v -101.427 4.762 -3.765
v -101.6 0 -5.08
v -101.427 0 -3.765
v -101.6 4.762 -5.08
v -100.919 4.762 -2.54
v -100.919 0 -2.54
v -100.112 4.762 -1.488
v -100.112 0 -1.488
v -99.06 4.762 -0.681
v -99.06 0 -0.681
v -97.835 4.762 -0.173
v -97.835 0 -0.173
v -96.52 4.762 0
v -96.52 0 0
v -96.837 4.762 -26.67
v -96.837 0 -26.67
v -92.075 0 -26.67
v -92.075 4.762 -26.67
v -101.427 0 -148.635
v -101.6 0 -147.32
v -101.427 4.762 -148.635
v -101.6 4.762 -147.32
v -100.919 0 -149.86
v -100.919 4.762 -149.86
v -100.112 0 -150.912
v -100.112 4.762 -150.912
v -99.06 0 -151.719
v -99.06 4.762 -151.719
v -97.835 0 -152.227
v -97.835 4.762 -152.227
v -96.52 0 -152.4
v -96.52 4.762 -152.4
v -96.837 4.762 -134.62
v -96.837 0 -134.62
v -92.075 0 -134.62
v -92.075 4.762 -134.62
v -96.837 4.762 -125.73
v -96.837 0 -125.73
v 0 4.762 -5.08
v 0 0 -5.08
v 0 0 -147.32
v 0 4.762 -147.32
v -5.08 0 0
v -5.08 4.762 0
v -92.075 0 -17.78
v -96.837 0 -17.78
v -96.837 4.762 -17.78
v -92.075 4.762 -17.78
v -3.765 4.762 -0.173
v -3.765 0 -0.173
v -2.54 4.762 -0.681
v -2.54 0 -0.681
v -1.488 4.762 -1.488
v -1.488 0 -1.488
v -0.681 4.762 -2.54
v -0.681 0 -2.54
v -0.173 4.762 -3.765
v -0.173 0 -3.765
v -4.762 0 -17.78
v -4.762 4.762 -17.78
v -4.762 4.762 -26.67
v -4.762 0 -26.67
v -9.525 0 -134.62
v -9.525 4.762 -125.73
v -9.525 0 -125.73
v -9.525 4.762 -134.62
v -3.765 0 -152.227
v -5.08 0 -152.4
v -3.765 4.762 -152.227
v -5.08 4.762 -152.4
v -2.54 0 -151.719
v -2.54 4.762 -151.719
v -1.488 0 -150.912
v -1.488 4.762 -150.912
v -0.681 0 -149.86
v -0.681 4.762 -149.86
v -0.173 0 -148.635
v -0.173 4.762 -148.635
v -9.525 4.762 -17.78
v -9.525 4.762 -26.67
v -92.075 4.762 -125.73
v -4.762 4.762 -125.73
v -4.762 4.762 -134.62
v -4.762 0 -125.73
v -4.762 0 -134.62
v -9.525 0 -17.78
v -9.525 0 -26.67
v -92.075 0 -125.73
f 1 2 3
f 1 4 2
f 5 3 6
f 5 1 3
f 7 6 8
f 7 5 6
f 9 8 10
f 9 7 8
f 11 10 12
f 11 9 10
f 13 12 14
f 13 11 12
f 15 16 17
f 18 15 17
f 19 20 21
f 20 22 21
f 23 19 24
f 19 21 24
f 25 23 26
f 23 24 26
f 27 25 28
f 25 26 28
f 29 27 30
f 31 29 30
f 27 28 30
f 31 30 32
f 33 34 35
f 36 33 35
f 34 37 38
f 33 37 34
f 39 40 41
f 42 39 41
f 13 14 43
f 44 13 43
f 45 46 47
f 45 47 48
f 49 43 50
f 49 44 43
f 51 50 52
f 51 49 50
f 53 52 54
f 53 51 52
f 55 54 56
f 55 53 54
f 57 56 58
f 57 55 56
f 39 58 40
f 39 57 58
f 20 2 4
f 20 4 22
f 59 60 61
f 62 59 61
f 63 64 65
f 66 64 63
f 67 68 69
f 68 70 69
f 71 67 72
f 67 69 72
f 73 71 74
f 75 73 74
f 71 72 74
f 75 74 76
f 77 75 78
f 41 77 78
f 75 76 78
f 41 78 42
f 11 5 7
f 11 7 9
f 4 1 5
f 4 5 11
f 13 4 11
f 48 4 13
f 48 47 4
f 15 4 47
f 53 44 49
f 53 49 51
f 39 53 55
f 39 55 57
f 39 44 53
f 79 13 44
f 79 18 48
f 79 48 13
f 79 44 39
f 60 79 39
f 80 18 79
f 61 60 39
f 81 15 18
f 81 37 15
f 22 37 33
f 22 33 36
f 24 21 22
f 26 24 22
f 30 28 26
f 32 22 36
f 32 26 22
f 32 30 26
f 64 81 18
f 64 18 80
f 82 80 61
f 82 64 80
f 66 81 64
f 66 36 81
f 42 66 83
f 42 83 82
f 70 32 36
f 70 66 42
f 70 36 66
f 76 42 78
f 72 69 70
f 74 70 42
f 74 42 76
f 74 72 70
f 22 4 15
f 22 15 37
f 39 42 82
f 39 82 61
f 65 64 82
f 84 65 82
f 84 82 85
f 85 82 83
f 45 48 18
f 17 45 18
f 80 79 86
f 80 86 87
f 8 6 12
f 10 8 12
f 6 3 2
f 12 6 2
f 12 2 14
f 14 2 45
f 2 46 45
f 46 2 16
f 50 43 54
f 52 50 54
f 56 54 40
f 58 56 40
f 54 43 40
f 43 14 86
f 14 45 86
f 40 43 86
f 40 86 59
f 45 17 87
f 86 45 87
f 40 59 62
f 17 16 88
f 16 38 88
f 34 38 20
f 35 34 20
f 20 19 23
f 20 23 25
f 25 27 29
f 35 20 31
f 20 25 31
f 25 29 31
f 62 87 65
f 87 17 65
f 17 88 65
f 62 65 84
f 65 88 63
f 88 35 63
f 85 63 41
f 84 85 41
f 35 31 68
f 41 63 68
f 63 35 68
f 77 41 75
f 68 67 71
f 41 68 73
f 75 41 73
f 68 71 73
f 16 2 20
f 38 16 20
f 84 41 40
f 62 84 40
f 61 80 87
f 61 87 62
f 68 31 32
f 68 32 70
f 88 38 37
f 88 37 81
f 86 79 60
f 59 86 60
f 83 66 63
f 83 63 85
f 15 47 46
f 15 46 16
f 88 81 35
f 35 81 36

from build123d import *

# Parameters (mm, degrees)
SKETCH1_W           = 101.6
SKETCH1_H           = 152.4
BOSS_EXTRUDE1_DEPTH = 4.7625
SKETCH2_W           = 4.7625
SKETCH2_H           = 8.89
CUT_EXTRUDE1_DEPTH  = 6.35
FILLET1_R           = 5.08


with BuildPart() as part:
    # Sketch1 → Boss-Extrude1 (new body)
    with BuildSketch(Plane(origin=(0, 0, 0), x_dir=(1, 0, 0), z_dir=(0, 1, 0))):
        with Locations((-50.8, 76.2)):
            Rectangle(SKETCH1_W, SKETCH1_H)
    extrude(amount=BOSS_EXTRUDE1_DEPTH)

    # Sketch2 → Cut-Extrude1 (cut)
    with BuildSketch(Plane(origin=(0, 4.7625, 0), x_dir=(1, 0, 0), z_dir=(0, 1, 0))):
        with Locations((-7.14375, 130.175)):
            Rectangle(SKETCH2_W, SKETCH2_H)
        with Locations((-94.45625, 130.175)):
            Rectangle(SKETCH2_W, SKETCH2_H)
        with Locations((-7.14375, 22.225)):
            Rectangle(SKETCH2_W, SKETCH2_H)
        with Locations((-94.45625, 22.225)):
            Rectangle(SKETCH2_W, SKETCH2_H)
    extrude(amount=-CUT_EXTRUDE1_DEPTH, mode=Mode.SUBTRACT)

    # Fillet1
    fillet1_edges = [part.edges().sort_by_distance(p)[0] for p in [
        (0, 2.38125, 0),
        (-101.6, 2.38125, 0),
        (-101.6, 2.38125, -152.4),
        (0, 2.38125, -152.4),
    ]]
    fillet(fillet1_edges, radius=FILLET1_R)


solid = part.part
